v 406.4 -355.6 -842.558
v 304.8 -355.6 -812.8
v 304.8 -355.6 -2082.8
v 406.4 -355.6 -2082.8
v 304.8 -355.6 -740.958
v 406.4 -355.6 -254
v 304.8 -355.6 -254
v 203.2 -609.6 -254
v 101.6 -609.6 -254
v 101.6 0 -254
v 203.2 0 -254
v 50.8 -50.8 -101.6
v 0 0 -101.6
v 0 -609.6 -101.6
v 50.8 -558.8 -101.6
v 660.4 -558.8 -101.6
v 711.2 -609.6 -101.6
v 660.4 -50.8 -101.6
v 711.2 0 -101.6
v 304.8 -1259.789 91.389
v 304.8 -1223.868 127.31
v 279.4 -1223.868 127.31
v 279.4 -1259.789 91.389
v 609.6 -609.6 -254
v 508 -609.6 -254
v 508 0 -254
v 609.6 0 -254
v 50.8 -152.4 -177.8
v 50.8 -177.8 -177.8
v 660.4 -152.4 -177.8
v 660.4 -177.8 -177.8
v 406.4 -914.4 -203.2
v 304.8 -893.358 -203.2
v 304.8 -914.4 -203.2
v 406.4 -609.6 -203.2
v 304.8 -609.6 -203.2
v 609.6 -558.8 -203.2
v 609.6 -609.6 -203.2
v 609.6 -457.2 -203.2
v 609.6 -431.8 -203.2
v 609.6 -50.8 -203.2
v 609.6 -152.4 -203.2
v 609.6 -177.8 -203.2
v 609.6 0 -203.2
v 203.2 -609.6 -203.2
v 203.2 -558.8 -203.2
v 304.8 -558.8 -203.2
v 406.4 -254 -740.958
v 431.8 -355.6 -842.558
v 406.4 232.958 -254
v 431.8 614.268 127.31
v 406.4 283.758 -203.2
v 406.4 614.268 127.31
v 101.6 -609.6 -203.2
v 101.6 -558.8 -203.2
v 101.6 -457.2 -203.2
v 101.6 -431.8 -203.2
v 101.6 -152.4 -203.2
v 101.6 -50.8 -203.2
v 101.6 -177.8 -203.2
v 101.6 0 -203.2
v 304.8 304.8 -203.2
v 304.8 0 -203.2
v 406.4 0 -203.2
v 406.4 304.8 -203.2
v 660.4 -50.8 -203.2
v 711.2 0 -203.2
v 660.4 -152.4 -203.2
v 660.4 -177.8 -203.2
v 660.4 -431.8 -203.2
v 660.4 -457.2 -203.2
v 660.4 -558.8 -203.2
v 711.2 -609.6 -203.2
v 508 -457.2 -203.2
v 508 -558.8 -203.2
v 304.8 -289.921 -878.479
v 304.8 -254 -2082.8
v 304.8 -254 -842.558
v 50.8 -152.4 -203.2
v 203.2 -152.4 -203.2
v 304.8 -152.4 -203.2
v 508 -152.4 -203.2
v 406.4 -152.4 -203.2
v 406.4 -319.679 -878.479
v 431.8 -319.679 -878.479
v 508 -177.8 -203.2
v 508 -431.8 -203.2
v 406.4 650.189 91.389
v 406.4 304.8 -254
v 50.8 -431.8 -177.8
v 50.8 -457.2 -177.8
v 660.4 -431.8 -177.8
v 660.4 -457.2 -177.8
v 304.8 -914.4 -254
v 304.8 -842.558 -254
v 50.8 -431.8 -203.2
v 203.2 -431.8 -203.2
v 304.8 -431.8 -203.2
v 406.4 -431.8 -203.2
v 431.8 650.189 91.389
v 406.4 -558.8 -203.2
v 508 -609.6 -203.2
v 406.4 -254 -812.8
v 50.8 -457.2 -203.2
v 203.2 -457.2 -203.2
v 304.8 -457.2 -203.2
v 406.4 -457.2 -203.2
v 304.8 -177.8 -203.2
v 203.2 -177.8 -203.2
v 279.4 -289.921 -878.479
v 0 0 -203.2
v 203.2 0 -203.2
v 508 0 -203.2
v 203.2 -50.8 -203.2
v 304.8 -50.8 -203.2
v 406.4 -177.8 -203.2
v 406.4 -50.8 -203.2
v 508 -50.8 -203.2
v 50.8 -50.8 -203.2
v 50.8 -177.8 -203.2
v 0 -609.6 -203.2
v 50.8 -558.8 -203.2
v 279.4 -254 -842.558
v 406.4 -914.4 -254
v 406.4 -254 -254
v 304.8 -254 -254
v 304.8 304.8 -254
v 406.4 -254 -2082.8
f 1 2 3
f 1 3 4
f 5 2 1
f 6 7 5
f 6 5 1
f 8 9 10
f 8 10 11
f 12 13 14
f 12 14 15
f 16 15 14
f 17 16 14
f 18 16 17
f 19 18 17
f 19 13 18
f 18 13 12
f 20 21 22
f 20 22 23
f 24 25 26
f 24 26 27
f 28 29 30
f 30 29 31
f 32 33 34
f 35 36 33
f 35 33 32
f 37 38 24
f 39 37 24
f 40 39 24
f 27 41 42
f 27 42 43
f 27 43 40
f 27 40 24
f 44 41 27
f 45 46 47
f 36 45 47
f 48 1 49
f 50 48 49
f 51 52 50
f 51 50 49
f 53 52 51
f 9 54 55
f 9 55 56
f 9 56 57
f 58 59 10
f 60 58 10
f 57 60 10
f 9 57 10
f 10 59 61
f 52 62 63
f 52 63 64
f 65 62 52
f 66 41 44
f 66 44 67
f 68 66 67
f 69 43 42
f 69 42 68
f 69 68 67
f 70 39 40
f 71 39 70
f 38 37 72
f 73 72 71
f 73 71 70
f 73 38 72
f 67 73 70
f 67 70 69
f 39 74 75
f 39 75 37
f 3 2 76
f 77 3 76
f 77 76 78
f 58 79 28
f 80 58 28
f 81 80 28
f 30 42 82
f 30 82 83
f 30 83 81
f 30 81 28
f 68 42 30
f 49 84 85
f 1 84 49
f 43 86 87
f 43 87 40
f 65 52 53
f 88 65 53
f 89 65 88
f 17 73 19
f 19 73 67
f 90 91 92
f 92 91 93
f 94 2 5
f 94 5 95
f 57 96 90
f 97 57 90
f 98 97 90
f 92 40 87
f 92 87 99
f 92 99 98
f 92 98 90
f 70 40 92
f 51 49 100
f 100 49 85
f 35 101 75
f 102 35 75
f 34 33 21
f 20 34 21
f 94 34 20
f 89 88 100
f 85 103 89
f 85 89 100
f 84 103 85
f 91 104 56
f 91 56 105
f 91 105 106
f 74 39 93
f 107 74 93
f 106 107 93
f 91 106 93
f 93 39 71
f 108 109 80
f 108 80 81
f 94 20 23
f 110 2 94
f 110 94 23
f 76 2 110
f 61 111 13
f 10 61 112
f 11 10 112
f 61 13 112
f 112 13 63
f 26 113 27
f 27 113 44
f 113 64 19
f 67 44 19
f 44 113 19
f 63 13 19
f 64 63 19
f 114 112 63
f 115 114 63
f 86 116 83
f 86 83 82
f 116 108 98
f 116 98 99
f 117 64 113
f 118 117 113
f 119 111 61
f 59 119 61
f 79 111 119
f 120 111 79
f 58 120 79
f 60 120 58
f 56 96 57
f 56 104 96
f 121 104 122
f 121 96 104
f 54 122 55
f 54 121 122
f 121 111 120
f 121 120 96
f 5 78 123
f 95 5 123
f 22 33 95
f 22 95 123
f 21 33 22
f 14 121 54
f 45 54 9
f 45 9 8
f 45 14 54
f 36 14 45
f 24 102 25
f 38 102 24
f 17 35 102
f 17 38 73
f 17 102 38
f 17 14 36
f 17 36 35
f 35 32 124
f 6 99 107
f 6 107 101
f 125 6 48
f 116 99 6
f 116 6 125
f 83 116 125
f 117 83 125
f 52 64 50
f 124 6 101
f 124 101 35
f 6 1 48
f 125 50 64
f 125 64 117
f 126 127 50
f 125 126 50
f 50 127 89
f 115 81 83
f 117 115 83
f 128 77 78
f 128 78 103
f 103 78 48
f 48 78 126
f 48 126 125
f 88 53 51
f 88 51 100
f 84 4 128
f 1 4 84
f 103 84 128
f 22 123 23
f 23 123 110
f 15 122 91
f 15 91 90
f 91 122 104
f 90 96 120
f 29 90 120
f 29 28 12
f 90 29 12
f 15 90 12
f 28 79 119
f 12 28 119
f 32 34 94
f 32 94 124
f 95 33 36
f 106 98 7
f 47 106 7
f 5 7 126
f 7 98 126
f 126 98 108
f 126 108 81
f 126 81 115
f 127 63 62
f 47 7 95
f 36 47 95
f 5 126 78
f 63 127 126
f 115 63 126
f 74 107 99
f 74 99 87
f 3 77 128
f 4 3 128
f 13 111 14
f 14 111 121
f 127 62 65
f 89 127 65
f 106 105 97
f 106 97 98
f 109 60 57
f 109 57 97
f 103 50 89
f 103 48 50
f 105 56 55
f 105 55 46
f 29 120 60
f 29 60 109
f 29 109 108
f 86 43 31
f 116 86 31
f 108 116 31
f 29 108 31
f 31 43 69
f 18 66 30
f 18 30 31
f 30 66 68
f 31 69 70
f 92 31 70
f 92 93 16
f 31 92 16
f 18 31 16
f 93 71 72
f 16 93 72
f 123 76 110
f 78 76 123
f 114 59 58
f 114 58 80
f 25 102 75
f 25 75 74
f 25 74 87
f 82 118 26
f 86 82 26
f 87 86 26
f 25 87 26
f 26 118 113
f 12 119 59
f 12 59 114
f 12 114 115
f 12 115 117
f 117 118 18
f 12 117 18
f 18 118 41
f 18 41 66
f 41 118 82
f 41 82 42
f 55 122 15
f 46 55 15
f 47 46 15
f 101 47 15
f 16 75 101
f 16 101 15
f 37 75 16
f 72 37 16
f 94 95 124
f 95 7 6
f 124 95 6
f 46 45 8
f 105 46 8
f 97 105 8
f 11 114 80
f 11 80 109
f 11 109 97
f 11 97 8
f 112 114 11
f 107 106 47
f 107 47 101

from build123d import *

# Parameters (mm, degrees)
F0_W      = 609.6
F0_H      = 50.8
F1_DEPTH  = 101.6
F2_W      = 101.6
F2_H      = 609.6
F2_H_2    = 1219.2
F3_DEPTH  = 50.8
F4_W      = 101.6
F4_H      = 101.6
F5_DEPTH  = 1828.8
F7_DEPTH  = 25.4
F9_DEPTH  = 25.4
F10_W     = 609.6
F10_H     = 25.4
F11_DEPTH = 25.4


with BuildPart() as f1:
    # F0 (on Top) → F1 (new body)
    with BuildSketch(Plane.XY):
        Polygon((50.8, 0), (0, 0), (0, -609.6), (50.8, -609.6), (50.8, -558.8), (50.8, -50.8), align=None)
        with Locations((355.6, -25.4)):
            Rectangle(F0_W, F0_H)
        Polygon((711.2, 0), (660.4, 0), (660.4, -50.8), (660.4, -558.8), (660.4, -609.6), (711.2, -609.6), align=None)
        with Locations((355.6, -584.2)):
            Rectangle(F0_W, F0_H)
    extrude(amount=-F1_DEPTH)

    # F2 (on Top) → F3 (join)
    with BuildSketch(Plane.XY):
        with Locations((152.4, -304.8)):
            Rectangle(F2_W, F2_H)
        with Locations((558.8, -304.8)):
            Rectangle(F2_W, F2_H)
        with Locations((355.6, -304.8)):
            Rectangle(F2_W, F2_H_2)
    extrude(amount=F3_DEPTH)

    # F4 (on face) → F5 (join)
    with BuildSketch(Plane.XY.offset(50.8)):
        with Locations((355.6, -304.8)):
            Rectangle(F4_W, F4_H)
    extrude(amount=F5_DEPTH)

    # F6 (on face) → F7 (join)
    with BuildSketch(Plane.YZ.offset(406.4)):
        Polygon((614.267661, -330.50971), (650.188686, -294.588686), (-319.678976, 675.278976), (-355.6, 639.357951), align=None)
    extrude(amount=F7_DEPTH)

    # F8 (on face) → F9 (join)
    with BuildSketch(Plane(origin=(304.8, 0, 0), x_dir=(0, -1, 0), z_dir=(-1, 0, 0))):
        Polygon((1223.867661, -330.50971), (1259.788686, -294.588686), (289.921024, 675.278976), (254, 639.357951), align=None)
    extrude(amount=F9_DEPTH)

    # F10 (on face) → F11 (join)
    with BuildSketch(Plane(origin=(0, 0, 0), x_dir=(1, 0, 0), z_dir=(0, 0, -1))):
        with Locations((355.6, 444.5)):
            Rectangle(F10_W, F10_H)
        with Locations((355.6, 165.1)):
            Rectangle(F10_W, F10_H)
    extrude(amount=F11_DEPTH)


with BuildPart() as f12_1:
    # F12: instance of F1
    add(f1.part.mirror(Plane(origin=(355.6, -304.8, -101.6), x_dir=(1, 0, 0), z_dir=(0, 0, -1))))


solid = f12_1.part
